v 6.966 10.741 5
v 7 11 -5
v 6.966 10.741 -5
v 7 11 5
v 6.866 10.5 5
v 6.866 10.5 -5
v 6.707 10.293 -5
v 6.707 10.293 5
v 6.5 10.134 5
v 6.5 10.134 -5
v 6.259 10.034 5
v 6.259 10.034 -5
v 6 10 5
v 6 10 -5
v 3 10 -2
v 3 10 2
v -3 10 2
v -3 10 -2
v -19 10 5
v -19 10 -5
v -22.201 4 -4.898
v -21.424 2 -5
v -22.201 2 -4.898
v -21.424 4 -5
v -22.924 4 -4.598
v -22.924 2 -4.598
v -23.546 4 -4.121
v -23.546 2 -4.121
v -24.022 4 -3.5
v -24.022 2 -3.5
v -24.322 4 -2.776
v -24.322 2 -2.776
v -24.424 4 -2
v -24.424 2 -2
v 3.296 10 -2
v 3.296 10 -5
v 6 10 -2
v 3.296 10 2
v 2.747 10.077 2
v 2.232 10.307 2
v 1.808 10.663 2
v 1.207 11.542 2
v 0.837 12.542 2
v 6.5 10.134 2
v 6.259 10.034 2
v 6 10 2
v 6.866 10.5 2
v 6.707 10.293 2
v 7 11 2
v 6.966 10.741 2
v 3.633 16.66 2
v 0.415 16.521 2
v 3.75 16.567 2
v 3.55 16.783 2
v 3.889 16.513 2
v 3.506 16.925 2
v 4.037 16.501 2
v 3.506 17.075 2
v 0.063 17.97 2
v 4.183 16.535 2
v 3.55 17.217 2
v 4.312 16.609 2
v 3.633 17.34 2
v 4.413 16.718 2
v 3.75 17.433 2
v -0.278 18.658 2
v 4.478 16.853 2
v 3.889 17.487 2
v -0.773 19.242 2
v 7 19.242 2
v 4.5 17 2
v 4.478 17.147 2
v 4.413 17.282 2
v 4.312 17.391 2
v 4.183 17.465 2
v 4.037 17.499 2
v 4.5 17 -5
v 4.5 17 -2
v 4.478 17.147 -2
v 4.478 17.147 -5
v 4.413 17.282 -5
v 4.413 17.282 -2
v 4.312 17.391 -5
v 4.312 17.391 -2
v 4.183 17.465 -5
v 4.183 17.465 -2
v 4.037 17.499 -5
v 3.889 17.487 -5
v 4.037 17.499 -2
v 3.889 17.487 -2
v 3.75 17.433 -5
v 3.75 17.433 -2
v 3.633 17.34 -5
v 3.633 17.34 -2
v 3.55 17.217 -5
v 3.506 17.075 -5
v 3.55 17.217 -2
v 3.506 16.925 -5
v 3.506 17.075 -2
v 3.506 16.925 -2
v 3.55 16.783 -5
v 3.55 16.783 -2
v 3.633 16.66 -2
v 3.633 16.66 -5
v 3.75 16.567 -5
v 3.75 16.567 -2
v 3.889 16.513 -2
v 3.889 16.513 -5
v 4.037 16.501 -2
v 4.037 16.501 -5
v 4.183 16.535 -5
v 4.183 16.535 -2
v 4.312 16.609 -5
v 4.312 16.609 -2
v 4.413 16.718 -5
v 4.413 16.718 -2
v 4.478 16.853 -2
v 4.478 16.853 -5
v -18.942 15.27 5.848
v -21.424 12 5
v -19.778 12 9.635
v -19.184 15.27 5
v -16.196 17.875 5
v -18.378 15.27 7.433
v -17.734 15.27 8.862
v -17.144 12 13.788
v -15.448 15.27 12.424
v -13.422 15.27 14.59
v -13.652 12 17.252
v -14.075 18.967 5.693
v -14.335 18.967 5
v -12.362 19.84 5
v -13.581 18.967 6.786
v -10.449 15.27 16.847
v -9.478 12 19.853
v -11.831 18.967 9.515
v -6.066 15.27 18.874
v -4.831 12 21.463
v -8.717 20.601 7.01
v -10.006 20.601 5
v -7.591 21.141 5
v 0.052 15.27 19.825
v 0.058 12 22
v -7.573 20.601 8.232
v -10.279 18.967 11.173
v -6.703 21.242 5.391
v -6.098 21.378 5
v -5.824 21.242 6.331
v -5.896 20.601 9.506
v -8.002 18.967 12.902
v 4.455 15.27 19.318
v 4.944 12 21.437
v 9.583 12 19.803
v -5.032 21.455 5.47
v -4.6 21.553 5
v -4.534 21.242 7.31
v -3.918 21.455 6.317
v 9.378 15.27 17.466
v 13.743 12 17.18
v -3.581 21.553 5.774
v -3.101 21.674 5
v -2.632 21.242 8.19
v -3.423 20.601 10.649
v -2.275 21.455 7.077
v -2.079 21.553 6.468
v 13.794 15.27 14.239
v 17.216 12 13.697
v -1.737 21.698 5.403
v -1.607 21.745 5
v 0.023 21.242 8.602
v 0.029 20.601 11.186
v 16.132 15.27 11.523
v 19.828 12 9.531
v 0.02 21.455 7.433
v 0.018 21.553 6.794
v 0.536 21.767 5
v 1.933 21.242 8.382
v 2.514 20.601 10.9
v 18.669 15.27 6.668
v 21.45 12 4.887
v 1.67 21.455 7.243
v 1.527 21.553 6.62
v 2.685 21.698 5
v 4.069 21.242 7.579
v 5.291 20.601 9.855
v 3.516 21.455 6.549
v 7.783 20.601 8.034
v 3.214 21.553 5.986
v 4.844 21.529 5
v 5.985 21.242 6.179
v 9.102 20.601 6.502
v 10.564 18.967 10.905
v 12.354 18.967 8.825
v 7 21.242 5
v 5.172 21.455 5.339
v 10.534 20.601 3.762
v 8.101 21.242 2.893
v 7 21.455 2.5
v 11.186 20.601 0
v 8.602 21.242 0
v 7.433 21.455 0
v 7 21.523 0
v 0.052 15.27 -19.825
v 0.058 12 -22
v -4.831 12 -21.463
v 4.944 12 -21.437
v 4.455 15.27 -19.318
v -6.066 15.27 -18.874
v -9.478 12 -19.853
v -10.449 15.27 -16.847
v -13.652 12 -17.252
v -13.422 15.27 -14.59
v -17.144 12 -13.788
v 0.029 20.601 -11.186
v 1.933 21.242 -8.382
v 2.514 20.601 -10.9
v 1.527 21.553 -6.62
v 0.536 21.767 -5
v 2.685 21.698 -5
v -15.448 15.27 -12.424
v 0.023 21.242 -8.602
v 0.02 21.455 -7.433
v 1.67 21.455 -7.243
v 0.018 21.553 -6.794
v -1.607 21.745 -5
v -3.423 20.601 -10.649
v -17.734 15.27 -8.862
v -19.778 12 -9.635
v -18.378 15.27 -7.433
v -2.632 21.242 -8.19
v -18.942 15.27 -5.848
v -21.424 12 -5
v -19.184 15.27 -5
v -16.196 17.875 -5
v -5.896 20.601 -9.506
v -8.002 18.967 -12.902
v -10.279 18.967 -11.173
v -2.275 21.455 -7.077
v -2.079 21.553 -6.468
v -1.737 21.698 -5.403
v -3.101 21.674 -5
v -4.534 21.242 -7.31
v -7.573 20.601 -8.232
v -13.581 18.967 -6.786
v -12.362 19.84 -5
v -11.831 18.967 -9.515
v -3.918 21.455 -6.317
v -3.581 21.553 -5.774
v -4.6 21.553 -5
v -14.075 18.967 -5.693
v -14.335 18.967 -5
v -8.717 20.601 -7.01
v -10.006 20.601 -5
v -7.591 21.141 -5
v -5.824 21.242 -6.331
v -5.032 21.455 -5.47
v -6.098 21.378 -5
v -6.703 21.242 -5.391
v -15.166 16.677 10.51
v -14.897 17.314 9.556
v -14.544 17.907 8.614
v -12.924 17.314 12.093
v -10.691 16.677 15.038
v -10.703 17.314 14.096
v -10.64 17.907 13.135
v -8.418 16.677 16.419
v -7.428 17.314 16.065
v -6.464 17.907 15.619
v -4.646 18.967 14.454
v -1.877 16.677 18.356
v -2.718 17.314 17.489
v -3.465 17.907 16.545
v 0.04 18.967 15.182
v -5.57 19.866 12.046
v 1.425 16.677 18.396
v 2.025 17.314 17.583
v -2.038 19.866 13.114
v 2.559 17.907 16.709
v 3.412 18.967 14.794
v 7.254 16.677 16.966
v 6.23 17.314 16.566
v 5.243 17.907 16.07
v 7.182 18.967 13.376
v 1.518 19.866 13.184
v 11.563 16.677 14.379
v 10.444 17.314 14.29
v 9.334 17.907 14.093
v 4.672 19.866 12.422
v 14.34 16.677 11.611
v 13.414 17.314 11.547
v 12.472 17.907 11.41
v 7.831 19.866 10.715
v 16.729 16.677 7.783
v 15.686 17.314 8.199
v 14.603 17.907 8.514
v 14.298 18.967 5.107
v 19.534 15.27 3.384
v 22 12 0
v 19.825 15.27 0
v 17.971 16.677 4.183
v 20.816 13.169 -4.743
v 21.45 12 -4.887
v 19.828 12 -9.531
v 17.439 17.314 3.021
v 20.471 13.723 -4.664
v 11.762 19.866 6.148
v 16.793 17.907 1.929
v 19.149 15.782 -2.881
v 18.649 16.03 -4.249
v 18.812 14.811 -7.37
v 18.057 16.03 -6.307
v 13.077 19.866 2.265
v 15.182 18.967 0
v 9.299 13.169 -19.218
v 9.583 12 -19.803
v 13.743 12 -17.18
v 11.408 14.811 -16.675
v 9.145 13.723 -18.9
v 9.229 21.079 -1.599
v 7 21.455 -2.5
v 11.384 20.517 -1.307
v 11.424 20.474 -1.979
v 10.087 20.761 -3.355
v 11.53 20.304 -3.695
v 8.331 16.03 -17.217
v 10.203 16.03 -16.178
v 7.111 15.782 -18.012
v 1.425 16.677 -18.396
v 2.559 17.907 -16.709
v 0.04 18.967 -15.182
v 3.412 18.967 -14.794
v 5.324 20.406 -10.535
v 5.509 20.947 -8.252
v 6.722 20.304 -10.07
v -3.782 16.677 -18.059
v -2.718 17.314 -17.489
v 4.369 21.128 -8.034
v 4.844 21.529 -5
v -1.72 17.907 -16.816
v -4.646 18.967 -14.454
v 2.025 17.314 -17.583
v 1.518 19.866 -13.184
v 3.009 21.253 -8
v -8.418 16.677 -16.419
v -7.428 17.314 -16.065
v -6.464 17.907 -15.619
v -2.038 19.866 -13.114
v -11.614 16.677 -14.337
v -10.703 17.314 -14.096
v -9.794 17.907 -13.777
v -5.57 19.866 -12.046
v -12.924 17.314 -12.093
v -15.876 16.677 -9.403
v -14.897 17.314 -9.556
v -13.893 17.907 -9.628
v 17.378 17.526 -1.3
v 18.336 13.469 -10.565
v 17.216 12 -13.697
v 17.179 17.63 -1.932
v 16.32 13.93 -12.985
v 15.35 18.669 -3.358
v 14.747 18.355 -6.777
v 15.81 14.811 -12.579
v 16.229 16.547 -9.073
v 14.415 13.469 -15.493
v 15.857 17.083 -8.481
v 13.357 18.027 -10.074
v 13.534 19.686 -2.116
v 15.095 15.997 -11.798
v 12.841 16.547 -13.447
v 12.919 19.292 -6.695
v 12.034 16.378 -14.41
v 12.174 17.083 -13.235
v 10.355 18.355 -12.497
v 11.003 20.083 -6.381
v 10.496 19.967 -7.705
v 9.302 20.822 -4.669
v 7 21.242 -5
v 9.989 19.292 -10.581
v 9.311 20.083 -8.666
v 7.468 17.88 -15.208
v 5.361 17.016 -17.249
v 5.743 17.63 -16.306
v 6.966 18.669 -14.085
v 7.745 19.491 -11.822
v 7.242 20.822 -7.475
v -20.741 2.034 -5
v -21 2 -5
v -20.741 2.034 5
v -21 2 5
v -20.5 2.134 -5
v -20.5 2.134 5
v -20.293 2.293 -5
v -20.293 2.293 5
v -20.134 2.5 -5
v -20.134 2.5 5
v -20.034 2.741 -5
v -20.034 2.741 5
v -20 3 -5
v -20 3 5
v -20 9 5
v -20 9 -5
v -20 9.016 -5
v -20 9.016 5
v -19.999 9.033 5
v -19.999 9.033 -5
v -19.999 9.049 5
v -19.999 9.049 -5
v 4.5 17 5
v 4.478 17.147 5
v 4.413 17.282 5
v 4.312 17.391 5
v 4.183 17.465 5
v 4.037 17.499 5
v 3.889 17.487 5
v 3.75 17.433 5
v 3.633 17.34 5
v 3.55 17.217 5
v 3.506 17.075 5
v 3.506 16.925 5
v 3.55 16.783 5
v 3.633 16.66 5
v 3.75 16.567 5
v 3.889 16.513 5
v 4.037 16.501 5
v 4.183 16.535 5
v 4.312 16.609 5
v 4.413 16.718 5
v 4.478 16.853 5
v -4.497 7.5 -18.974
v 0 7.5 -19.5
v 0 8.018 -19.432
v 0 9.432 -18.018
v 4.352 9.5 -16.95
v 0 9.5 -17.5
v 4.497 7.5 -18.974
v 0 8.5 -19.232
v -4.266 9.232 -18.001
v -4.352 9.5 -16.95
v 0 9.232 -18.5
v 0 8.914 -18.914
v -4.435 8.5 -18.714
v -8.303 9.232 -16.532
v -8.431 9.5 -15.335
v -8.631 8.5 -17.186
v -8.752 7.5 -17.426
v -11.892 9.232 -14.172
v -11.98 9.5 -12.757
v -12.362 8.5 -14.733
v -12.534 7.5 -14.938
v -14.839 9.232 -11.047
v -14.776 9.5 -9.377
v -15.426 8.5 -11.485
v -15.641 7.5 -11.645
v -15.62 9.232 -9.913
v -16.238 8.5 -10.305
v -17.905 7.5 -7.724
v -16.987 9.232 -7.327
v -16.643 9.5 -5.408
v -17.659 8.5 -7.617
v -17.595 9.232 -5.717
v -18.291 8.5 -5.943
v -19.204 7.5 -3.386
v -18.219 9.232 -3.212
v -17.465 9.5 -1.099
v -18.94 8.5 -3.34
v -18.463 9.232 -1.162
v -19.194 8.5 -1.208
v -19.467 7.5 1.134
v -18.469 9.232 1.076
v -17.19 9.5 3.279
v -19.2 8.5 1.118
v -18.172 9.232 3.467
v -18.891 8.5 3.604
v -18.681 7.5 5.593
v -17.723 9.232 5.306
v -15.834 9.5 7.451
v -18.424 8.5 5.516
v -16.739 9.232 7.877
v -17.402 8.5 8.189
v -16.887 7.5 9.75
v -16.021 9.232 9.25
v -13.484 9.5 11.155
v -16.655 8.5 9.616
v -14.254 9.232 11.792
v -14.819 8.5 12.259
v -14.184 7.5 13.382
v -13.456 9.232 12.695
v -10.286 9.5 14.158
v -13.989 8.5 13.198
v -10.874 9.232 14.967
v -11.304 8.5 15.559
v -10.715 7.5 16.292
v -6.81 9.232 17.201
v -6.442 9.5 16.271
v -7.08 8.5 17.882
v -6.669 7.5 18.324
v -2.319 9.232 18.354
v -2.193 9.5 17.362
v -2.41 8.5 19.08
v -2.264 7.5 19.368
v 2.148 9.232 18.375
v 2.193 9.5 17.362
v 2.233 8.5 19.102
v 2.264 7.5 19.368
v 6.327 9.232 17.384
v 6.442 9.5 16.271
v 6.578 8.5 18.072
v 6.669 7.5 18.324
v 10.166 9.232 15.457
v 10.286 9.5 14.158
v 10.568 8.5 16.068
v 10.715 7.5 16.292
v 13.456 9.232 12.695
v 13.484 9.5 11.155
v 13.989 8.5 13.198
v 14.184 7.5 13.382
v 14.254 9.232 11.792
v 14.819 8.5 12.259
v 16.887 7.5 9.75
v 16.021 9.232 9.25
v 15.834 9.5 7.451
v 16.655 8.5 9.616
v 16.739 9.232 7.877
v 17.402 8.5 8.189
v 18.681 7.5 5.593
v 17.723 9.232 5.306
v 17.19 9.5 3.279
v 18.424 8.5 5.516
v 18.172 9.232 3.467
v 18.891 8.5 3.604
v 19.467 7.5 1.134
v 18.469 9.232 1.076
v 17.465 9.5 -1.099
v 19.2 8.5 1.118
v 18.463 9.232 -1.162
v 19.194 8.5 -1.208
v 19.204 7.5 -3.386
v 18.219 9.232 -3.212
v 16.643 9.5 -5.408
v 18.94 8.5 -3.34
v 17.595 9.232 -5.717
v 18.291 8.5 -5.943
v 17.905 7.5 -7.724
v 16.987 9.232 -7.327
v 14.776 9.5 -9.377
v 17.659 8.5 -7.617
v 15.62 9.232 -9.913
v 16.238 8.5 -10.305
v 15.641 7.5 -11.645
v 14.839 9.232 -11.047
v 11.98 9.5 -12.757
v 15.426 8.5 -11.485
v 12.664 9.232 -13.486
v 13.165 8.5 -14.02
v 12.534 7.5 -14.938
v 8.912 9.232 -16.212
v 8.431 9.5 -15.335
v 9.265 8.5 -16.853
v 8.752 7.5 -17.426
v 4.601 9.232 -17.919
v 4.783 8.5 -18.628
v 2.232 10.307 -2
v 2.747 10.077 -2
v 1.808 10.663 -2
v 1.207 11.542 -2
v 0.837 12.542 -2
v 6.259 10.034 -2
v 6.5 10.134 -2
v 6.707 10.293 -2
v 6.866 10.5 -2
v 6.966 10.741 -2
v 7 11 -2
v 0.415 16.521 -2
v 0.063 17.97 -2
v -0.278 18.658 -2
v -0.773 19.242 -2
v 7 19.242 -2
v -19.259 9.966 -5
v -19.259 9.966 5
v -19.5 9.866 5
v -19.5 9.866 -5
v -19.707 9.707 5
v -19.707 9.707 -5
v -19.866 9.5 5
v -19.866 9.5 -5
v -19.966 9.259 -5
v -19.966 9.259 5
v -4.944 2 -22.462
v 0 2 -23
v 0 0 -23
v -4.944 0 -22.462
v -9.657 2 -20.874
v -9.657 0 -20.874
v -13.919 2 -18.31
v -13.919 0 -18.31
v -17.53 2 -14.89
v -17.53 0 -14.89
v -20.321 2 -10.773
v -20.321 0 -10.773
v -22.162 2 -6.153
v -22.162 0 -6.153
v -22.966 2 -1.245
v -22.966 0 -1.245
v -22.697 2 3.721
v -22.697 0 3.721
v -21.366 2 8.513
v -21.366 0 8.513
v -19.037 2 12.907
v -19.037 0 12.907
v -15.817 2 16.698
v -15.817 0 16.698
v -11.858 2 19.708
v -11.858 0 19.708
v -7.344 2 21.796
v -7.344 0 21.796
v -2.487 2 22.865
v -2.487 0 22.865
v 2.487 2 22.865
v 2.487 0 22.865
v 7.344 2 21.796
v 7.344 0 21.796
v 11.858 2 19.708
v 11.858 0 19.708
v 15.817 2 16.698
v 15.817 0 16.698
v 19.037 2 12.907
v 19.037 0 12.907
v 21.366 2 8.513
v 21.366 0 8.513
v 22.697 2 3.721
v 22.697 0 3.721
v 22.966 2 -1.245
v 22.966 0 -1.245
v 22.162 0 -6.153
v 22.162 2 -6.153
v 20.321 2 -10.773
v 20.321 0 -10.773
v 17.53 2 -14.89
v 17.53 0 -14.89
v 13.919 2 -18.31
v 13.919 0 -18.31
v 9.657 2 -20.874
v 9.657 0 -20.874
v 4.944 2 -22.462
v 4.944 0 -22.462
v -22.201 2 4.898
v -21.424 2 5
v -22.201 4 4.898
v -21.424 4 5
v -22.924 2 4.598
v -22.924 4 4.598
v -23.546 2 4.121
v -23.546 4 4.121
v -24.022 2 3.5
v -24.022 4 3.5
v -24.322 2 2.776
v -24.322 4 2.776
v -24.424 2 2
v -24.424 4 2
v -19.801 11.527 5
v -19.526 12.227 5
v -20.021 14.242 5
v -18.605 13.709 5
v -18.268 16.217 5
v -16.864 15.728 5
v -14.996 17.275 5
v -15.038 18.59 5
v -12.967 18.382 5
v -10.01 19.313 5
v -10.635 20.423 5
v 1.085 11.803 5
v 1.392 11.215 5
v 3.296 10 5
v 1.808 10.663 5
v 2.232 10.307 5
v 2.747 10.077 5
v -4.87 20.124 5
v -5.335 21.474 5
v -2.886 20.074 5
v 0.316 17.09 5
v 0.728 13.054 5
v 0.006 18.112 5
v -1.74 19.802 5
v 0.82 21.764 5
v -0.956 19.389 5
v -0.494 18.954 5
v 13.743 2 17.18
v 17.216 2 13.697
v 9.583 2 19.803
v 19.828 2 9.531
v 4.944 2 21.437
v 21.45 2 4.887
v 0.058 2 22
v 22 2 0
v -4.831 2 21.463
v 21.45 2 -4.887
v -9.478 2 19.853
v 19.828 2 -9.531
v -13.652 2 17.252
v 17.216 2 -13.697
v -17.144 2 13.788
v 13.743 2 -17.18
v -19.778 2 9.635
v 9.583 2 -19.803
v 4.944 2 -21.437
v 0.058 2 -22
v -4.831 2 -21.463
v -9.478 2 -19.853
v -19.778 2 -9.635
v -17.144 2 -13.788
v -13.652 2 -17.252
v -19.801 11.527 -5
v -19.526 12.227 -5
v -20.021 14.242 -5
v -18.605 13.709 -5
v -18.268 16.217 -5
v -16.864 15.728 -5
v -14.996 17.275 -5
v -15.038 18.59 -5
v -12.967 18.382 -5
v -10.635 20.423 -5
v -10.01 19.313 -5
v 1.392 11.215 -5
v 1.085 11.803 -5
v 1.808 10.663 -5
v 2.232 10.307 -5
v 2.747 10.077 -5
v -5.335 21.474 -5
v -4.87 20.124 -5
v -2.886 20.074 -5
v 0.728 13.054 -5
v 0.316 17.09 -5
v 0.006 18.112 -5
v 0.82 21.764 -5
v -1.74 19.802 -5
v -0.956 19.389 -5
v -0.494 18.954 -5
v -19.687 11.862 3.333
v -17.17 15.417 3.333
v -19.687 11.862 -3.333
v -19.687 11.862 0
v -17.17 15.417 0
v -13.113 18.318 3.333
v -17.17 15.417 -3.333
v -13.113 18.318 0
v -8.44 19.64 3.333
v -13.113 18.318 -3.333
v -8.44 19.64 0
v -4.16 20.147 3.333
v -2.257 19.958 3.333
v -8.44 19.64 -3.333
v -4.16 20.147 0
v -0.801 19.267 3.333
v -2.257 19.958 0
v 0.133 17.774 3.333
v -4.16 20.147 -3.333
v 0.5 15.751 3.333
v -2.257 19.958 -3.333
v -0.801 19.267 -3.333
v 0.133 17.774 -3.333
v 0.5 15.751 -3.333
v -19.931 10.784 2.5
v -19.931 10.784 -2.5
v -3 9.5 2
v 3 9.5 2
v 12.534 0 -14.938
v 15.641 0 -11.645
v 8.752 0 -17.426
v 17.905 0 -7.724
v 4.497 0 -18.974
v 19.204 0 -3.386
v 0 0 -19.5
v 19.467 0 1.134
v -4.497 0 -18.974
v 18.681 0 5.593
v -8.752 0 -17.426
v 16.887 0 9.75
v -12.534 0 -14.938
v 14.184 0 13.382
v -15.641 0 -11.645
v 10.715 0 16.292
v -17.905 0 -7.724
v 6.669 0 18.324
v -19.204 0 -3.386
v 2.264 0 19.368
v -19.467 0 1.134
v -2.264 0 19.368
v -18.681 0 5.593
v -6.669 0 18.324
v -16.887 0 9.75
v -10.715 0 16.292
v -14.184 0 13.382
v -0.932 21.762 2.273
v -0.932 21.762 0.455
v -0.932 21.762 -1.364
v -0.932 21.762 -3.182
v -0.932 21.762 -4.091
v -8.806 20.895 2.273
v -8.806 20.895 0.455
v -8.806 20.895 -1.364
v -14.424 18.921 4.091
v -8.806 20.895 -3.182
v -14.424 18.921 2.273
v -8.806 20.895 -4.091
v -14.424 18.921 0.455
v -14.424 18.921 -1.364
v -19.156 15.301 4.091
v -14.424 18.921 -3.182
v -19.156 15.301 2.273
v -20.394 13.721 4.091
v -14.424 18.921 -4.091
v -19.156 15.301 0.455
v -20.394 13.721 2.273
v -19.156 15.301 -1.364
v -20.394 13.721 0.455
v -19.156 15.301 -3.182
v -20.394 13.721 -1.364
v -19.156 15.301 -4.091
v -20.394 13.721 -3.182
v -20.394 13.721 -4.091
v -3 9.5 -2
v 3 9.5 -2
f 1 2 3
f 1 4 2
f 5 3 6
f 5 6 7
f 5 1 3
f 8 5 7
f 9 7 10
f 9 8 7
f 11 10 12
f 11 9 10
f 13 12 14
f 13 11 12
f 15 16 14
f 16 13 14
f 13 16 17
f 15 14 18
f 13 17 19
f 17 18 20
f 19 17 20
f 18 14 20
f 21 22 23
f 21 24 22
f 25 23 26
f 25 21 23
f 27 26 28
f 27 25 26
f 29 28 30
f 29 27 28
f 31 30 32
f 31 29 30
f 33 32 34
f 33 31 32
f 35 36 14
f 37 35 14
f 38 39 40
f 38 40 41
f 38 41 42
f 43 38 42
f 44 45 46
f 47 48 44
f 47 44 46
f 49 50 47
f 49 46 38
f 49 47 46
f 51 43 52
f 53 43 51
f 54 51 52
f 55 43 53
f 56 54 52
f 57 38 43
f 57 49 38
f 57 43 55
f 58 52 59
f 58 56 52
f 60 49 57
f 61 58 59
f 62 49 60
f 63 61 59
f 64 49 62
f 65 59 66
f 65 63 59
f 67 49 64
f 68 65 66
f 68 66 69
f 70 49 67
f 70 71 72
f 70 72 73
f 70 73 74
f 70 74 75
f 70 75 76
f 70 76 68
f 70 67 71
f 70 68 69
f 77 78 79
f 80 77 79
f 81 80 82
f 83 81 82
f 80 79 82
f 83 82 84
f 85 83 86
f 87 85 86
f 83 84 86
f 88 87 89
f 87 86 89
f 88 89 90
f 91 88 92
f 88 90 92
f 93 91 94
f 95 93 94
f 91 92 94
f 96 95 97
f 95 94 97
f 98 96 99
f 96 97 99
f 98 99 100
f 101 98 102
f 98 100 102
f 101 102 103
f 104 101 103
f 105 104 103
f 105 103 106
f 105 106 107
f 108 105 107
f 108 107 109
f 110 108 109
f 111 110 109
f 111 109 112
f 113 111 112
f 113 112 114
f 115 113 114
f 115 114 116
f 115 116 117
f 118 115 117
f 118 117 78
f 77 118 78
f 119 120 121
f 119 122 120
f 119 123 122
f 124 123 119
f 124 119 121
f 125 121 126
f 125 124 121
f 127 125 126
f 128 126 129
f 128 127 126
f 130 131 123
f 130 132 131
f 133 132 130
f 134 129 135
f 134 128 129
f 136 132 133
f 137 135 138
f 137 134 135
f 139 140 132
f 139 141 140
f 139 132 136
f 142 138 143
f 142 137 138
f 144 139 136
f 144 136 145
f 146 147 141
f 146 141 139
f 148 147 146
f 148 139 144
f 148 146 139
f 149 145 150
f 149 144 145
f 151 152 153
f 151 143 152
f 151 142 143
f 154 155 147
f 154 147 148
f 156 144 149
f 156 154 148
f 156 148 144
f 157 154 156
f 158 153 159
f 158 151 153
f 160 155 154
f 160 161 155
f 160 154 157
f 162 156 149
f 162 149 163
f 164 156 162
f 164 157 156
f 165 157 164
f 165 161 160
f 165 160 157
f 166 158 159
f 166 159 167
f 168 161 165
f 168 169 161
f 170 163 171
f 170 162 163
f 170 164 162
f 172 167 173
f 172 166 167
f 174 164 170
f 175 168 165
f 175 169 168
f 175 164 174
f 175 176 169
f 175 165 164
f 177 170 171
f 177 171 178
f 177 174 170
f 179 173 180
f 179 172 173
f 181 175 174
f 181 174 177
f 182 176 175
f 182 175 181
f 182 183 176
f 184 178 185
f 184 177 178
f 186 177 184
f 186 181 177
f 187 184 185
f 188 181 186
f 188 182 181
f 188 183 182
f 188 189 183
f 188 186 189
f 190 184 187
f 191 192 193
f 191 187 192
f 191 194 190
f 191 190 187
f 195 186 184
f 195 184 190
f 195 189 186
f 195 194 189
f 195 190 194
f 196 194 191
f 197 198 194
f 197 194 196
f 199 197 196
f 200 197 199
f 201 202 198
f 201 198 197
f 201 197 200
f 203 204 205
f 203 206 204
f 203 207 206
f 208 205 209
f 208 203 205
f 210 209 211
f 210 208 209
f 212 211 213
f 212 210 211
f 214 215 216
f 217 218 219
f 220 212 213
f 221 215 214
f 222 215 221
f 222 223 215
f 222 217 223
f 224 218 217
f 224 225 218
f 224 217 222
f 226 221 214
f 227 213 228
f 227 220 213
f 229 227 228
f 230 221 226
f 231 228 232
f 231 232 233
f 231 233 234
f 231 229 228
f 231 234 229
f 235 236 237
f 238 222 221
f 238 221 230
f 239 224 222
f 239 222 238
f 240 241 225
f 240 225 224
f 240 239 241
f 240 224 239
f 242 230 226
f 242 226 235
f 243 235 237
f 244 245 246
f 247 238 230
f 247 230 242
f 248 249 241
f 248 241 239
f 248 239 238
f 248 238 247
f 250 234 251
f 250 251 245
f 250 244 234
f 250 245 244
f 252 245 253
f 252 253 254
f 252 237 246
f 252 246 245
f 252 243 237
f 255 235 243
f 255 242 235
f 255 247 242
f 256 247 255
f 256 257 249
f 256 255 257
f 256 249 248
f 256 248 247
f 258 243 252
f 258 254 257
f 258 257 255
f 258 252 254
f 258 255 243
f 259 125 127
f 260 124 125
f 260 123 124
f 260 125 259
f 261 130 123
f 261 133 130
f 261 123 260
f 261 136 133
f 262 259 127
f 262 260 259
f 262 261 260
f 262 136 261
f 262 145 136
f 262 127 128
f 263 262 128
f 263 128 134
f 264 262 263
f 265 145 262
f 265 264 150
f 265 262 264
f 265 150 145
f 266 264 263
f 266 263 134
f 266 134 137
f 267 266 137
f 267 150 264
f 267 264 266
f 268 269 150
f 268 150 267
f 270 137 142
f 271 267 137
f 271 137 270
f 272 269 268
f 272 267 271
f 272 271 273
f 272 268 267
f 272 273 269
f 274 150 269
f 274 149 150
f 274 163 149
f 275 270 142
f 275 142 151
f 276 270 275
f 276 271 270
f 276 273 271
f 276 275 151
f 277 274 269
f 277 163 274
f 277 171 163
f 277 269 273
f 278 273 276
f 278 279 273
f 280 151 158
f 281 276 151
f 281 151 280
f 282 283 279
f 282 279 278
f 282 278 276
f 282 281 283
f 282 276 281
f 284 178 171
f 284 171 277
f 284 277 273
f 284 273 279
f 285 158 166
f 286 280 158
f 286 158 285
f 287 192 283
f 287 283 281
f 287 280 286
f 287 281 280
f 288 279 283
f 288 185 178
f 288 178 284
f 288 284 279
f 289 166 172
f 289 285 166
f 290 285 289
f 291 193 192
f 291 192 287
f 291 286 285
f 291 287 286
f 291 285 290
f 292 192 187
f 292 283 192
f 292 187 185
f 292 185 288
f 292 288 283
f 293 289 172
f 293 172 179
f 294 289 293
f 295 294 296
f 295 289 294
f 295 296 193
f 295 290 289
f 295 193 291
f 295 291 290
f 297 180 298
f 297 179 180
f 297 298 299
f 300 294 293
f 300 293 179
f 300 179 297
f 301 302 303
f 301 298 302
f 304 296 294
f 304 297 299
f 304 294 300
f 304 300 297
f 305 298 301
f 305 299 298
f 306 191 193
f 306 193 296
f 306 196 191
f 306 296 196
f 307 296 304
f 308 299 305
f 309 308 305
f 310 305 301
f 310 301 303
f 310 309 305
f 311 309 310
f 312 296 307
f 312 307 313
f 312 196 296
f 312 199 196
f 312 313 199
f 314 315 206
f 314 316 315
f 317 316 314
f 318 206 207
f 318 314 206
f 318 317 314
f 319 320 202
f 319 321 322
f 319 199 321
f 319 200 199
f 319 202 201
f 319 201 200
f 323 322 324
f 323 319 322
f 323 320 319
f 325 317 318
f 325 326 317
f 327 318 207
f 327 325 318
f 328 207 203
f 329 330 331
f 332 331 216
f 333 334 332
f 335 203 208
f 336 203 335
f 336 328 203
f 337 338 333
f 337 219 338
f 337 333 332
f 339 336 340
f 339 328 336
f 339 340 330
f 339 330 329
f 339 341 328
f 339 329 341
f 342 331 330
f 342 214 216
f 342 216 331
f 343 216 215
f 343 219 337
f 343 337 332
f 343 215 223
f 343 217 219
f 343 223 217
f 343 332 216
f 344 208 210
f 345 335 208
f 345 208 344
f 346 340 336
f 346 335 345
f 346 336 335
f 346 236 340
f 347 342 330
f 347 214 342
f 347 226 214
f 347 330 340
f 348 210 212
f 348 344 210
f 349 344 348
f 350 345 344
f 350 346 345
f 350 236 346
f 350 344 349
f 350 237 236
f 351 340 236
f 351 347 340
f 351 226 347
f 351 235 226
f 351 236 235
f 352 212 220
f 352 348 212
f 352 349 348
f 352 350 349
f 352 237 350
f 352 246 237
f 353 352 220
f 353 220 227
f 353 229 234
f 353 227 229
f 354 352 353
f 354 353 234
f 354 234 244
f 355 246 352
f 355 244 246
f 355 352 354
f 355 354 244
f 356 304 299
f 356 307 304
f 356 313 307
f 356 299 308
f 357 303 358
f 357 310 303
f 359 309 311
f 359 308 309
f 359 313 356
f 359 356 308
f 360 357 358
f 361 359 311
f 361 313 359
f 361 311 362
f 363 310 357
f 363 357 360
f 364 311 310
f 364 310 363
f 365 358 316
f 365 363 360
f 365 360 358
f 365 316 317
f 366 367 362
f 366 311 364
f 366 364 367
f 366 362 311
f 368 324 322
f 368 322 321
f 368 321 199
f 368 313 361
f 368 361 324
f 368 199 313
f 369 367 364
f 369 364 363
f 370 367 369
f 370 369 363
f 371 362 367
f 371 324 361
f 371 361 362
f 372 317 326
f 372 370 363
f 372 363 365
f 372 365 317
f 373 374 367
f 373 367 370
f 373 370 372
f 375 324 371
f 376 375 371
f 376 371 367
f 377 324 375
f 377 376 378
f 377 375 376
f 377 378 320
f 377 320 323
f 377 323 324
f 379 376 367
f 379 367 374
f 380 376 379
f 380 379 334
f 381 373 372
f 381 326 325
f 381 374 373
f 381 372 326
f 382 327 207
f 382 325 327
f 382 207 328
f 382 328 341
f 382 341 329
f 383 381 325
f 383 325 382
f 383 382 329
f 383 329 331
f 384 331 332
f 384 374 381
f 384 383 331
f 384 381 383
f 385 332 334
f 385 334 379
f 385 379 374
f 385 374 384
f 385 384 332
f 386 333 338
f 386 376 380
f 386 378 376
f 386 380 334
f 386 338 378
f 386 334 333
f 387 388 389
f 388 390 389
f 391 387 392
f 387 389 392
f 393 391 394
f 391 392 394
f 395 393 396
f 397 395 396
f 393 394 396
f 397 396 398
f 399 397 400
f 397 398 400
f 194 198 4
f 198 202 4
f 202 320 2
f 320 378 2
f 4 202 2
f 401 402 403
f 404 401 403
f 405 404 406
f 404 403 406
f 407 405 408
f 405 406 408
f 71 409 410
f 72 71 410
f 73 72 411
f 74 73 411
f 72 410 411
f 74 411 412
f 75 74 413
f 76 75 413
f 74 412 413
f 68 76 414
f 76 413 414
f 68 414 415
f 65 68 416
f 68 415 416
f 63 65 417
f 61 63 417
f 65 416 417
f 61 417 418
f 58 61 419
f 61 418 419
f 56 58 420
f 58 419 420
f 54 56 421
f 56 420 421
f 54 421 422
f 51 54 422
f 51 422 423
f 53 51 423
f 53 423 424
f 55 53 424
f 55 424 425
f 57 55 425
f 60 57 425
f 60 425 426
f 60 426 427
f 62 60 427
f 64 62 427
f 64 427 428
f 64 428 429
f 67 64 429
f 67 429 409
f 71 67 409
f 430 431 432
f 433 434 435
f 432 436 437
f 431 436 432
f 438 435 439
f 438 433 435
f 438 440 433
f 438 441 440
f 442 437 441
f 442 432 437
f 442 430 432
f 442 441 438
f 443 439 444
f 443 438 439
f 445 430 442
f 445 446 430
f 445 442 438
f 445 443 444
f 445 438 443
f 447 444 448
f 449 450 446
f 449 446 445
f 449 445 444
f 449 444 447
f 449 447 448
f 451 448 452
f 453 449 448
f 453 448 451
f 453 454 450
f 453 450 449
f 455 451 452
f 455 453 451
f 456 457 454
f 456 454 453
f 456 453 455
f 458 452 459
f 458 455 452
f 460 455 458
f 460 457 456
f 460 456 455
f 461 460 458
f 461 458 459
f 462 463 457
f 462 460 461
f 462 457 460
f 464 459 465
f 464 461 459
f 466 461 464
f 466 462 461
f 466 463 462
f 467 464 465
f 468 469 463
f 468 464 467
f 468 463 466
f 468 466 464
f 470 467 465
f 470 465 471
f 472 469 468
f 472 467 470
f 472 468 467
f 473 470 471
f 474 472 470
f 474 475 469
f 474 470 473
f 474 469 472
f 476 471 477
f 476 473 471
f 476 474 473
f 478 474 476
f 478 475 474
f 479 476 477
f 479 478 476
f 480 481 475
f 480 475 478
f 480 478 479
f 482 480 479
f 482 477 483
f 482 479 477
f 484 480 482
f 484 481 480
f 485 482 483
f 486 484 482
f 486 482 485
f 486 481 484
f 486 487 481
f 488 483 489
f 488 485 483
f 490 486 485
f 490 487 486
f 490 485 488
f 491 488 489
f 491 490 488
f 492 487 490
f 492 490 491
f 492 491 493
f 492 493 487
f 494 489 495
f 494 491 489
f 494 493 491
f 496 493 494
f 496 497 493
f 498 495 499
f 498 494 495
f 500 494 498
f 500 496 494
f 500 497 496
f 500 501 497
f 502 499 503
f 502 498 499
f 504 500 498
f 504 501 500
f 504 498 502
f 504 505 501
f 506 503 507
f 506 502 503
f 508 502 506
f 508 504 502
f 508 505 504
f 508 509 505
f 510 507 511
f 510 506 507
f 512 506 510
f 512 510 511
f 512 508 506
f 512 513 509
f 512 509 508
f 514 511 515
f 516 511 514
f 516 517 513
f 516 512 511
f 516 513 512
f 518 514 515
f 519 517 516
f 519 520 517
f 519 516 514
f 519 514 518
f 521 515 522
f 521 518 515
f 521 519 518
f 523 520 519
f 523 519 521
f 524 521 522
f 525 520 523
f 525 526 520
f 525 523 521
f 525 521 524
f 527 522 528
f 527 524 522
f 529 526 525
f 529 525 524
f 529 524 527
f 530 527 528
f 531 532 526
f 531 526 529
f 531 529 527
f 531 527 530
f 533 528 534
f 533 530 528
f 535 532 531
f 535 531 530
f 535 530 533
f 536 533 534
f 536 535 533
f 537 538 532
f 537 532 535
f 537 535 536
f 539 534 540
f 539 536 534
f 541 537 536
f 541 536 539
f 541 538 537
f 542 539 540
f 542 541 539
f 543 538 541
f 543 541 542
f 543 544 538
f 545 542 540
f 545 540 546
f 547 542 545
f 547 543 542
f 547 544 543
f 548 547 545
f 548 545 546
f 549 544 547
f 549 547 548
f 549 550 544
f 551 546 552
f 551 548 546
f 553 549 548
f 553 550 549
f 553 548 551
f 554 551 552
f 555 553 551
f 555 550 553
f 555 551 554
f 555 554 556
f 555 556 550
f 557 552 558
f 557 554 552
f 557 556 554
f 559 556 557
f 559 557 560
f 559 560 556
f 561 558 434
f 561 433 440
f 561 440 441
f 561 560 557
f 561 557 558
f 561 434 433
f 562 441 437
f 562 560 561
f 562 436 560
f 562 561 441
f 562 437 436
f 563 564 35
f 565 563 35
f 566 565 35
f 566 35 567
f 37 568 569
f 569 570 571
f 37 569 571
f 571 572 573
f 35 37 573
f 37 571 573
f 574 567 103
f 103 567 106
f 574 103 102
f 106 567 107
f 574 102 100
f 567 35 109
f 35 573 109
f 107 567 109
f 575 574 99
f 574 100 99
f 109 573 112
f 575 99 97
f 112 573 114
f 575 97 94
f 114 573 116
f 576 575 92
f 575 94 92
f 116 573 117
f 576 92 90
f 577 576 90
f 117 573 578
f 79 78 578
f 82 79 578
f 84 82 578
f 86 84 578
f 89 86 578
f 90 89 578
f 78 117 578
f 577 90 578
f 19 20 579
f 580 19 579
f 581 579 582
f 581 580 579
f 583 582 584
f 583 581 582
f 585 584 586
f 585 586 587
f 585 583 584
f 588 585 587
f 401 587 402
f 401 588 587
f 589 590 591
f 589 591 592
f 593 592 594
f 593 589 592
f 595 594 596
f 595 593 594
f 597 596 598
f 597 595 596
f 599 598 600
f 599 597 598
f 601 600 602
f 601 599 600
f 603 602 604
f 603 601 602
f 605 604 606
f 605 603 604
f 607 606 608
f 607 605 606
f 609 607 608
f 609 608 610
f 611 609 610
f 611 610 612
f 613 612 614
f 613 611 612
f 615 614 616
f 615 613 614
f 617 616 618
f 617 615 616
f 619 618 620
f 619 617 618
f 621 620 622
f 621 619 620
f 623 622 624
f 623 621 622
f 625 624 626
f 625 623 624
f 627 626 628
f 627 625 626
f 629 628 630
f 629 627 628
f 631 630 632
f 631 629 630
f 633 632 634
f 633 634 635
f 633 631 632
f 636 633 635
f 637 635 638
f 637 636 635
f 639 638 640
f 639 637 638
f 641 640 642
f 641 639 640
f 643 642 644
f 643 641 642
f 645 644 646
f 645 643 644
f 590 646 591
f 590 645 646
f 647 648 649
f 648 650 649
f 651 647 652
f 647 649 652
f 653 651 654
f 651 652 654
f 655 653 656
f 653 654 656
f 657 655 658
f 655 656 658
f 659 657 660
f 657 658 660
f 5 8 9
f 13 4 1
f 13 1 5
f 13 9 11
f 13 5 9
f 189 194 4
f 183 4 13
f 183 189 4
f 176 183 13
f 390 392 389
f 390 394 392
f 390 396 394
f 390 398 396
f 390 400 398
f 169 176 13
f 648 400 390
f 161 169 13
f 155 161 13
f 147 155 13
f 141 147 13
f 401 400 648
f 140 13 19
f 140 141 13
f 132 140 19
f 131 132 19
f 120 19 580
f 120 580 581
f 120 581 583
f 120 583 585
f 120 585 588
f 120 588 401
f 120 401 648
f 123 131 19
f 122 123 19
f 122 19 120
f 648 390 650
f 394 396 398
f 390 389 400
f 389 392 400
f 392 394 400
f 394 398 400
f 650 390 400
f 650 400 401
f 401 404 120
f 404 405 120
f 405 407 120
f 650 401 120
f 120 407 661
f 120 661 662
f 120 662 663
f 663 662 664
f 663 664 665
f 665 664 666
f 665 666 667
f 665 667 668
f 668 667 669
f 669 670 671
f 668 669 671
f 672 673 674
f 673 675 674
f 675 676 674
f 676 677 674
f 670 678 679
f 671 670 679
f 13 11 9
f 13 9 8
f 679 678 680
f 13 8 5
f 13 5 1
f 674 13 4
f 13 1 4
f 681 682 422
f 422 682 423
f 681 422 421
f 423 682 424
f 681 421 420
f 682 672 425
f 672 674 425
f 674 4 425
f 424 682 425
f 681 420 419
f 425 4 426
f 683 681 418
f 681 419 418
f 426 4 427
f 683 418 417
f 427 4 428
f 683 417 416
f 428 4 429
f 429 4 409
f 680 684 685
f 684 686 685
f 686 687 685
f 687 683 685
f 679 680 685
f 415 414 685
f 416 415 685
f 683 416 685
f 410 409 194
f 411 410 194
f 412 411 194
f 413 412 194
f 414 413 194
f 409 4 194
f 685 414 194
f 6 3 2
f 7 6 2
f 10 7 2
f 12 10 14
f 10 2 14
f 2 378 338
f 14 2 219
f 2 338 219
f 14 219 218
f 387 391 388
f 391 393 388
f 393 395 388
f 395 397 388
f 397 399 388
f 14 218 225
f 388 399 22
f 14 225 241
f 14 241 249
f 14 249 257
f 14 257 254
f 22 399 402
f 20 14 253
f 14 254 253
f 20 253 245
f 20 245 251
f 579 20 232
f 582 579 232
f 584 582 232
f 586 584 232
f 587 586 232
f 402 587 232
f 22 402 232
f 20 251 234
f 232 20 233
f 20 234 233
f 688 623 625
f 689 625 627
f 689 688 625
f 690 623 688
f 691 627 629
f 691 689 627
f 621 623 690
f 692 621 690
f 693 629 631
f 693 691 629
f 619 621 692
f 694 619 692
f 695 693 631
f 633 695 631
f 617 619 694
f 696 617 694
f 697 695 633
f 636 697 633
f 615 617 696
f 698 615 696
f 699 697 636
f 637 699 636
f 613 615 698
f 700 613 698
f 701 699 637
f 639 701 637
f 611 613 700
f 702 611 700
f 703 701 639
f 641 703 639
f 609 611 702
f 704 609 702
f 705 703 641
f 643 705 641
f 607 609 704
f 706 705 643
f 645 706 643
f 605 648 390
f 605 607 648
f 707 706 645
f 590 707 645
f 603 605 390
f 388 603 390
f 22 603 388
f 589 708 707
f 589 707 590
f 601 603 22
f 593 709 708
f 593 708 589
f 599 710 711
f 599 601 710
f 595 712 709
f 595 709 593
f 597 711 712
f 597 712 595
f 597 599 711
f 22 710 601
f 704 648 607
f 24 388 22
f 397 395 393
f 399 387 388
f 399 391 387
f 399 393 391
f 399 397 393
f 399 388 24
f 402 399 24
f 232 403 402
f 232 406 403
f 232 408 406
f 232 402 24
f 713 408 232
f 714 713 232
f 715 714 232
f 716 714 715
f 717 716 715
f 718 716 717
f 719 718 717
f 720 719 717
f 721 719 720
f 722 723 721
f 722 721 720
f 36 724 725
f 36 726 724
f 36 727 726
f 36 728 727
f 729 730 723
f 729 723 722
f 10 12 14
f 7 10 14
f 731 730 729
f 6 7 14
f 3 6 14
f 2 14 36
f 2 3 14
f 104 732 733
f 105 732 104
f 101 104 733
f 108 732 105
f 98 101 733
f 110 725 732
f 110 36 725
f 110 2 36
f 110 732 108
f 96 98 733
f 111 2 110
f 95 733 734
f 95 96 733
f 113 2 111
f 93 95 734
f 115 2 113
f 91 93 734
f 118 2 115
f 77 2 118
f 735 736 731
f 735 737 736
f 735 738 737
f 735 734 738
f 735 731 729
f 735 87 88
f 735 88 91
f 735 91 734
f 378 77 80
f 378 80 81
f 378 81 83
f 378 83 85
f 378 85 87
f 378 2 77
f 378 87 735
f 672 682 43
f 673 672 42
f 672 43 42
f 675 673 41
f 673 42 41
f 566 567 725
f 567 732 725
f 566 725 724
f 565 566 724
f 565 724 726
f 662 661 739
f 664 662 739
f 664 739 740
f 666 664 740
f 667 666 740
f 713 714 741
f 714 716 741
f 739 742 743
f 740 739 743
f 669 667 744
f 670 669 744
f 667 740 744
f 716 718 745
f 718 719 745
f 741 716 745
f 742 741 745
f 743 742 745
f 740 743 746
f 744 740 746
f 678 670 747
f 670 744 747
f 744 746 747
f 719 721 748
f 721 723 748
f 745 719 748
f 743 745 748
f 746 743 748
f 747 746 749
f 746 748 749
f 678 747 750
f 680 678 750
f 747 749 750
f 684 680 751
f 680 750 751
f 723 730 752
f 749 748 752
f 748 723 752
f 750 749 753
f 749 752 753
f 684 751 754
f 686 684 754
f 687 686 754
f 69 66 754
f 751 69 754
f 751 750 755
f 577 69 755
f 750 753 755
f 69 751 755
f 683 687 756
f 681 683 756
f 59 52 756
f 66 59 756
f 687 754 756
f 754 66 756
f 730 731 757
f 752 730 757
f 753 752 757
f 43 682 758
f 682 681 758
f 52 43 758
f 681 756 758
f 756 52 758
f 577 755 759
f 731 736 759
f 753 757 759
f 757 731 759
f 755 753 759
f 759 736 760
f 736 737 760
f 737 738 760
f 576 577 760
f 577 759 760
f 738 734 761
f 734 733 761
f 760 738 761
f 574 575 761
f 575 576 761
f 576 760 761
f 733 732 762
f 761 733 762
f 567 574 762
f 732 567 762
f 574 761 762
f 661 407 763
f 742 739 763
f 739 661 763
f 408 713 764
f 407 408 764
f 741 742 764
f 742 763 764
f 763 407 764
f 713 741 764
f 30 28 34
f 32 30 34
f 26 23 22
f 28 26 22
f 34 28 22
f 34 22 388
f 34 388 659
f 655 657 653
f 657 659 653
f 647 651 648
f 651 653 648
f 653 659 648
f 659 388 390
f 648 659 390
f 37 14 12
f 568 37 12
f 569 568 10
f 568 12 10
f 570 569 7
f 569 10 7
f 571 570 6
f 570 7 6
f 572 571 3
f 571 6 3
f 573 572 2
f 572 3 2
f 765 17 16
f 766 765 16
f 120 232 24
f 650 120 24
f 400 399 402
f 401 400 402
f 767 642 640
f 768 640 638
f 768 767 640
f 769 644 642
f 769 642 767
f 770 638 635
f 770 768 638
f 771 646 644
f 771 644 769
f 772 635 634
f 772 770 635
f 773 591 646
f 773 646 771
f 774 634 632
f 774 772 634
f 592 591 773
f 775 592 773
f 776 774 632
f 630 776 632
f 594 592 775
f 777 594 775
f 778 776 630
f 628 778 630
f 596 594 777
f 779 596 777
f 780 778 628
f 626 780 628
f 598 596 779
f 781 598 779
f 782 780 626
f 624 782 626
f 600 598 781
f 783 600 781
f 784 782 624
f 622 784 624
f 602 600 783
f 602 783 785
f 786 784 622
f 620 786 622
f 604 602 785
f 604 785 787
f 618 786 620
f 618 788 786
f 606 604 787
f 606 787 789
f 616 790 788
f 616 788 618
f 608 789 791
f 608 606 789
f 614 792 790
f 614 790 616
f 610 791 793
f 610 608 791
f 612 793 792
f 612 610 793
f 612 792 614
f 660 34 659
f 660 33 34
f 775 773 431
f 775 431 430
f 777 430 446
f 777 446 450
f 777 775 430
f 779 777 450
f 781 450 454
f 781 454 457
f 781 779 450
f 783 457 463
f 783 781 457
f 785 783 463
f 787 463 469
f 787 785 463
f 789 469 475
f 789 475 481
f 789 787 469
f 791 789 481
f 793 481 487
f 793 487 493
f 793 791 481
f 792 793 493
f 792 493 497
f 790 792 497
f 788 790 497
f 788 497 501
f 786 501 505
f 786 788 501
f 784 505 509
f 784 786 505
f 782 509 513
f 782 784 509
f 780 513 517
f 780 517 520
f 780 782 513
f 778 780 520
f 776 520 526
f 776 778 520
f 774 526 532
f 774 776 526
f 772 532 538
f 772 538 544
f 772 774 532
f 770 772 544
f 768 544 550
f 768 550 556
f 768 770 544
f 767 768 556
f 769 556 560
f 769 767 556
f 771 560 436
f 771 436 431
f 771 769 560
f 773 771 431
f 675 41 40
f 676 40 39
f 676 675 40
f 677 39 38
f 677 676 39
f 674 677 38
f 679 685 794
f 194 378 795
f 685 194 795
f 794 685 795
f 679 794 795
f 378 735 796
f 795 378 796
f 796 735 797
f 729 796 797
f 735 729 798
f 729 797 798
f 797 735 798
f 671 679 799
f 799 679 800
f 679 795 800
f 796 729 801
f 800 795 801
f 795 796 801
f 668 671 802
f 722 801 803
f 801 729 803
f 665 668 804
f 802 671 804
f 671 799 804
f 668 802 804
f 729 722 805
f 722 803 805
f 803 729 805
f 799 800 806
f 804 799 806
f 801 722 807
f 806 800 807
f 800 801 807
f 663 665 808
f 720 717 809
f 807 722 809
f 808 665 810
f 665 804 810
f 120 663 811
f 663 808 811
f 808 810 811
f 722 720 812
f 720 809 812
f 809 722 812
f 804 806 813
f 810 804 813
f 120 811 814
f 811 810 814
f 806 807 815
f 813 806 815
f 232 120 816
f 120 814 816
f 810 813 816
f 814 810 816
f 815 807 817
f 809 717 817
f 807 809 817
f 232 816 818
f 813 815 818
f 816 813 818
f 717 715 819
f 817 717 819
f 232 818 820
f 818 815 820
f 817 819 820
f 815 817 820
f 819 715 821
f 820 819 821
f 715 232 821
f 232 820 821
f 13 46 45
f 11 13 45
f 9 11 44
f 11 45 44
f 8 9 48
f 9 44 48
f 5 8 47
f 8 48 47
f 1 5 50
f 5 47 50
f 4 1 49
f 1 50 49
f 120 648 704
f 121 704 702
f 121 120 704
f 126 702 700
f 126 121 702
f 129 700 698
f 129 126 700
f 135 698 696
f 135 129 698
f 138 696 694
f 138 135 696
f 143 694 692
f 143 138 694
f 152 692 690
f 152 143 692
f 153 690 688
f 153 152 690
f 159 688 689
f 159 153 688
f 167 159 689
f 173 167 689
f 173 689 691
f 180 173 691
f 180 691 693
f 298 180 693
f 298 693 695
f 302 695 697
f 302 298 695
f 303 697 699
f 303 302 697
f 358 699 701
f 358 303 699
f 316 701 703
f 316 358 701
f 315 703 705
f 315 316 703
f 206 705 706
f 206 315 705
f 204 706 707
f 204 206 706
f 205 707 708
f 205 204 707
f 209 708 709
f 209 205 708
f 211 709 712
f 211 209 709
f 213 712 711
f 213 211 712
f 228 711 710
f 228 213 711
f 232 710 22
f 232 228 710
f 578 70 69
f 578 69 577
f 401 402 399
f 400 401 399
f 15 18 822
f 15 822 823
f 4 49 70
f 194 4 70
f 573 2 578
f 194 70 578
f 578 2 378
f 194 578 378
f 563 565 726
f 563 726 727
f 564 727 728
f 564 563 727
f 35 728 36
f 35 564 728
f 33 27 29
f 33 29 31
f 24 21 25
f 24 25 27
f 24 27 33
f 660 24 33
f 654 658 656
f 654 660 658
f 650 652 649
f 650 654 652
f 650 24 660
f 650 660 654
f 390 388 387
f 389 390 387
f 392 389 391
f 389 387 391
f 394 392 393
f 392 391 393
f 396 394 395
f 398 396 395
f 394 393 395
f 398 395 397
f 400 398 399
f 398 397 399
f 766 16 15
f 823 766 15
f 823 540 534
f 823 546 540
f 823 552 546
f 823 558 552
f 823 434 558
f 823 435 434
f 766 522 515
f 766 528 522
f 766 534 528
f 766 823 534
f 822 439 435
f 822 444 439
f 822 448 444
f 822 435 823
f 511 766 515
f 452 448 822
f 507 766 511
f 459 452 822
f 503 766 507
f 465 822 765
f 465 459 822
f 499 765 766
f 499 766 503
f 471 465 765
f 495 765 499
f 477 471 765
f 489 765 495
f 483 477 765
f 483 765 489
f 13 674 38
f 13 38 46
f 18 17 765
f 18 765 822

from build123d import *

# Parameters (mm, degrees)
LEVER_SLOT_CUT_DEPTH      = 5
LEVER_SLOT_CUT_DEPTH_BACK = 5
LEVER_SLOT_FILLET_R       = 1
CUP_PLUNGER_PROFILE_W     = 6
CUP_PLUNGER_PROFILE_H     = 4
CUP_PLUNGER_CUT_DEPTH     = 35.591006714
LEVER_EXTRUDE_DEPTH       = 5
LEVER_EXTRUDE_DEPTH_BACK  = 5
FINGER_CATCH_PROFILE_W    = 10
FINGER_CATCH_PROFILE_H    = 2
FINGER_CATCH_DEPTH        = 3
FINGER_CATCH_FILLET_R     = 3
LEVER_START               = -10
LEVER_SHAPE_CUT_DEPTH     = 10
LEVER_FILLET_R            = 2
PIN_HOLE_PROFILE_R        = 0.5
PIN_HOLE_CUT_DEPTH        = 10
PLUNGER_SLOT_PROFILE_W    = 4
PLUNGER_SLOT_PROFILE_H    = 10
PLUNGER_SLOT_CUT_DEPTH    = 10


with BuildPart() as part:
    # Suction Cup Profile → Suction Cup Revolve (revolve)
    with BuildSketch(Plane.XY):
        with BuildLine():
            Line((0, 0), (-23, 0))
            Line((-23, 0), (-23, 2))
            Line((-23, 2), (-22, 2))
            Line((-22, 2), (-22, 12))
            add(Edge.make_bspline(
                [(-22, 12), (-18.421815933, 19.051481144), (-11.029248688, 22), (0, 22)],
                knots=[0, 0, 0, 0, 1, 1, 1, 1], degree=3))
            Line((0, 22), (0, 0))
        make_face()
    revolve(axis=Axis((0, 0, 0), (0, 1, 0)))

    # Lever Slot Profile → Lever Slot Cut (cut, two sides: drawn at the far end of the back side and taken through both)
    with BuildSketch(Plane.XY.offset(-LEVER_SLOT_CUT_DEPTH_BACK)):
        Polygon((7, 10), (-20, 10), (-20, 2), (-23, 2), (-23, 26), (7, 26), align=None)
    extrude(amount=LEVER_SLOT_CUT_DEPTH + LEVER_SLOT_CUT_DEPTH_BACK, mode=Mode.SUBTRACT)

    # Lever Slot Fillet
    lever_slot_fillet_edges = [part.edges().sort_by_distance(p)[0] for p in [
        (7, 10, 0),
        (-20, 2, 0),
        (-20, 10, 0),
    ]]
    fillet(lever_slot_fillet_edges, radius=LEVER_SLOT_FILLET_R)

    # Cup Plunger Profile → Cup Plunger Cut (cut, through all)
    with BuildSketch(Plane(origin=(0, 10, 0), x_dir=(1, 0, 0), z_dir=(0, 1, 0))):
        Rectangle(CUP_PLUNGER_PROFILE_W, CUP_PLUNGER_PROFILE_H)
    extrude(amount=-CUP_PLUNGER_CUT_DEPTH, mode=Mode.SUBTRACT)

    # Pad Slot Profile → Pad Cut Profile (revolve, cut)
    with BuildSketch(Plane.XY):
        with BuildLine():
            Line((0, 9.5), (-17.5, 9.5))
            ThreePointArc((-17.5, 9.5), (-18.914213562, 8.914213562), (-19.5, 7.5))
            Line((-19.5, 7.5), (-19.5, -2.5))
            Line((-19.5, -2.5), (0, -2.5))
            Line((0, -2.5), (0, 9.5))
        make_face()
    revolve(axis=Axis((0, 0, 0), (0, 1, 0)), mode=Mode.SUBTRACT)


with BuildPart() as body_2:
    # Lever Extrude Profile → Lever Extrude (new, two sides: drawn at the far end of the back side and taken through both)
    with BuildSketch(Plane.XY.offset(-LEVER_EXTRUDE_DEPTH_BACK)):
        with BuildLine():
            Line((-19, 10), (6, 10))
            ThreePointArc((6, 10), (6.707106781, 10.292893219), (7, 11))
            Line((7, 11), (7, 21.242307449))
            add(Edge.make_bspline(
                [(7, 21.242307449), (5.685724143, 21.456777565), (4.358857594, 21.595849723), (1.708877373, 21.760019267), (0.387036337, 21.785917476), (-2.251022195, 21.737377334), (-3.567218971, 21.662569282), (-6.192544108, 21.386836768), (-7.501677285, 21.185998254), (-10.10988568, 20.604864637), (-11.383851689, 20.229558725), (-13.228387001, 19.49844466), (-13.832374383, 19.226486682), (-15.014912539, 18.616381153), (-15.596770073, 18.275704638), (-17.259236778, 17.163531752), (-18.26441362, 16.299840579), (-19.378857685, 15.051885465), (-19.594879608, 14.793479293), (-20.007615977, 14.266070663), (-20.599773978, 13.456964359), (-21.113866261, 12.595730264), (-21.424285286, 12)],
                knots=[0, 0, 0, 0, 0.125, 0.125, 0.25, 0.25, 0.375, 0.375, 0.5, 0.5, 0.625, 0.625, 0.6875, 0.6875, 0.75, 0.75, 0.875, 0.875, 0.90625, 0.90625, 0.9375, 1, 1, 1, 1], degree=3))
            Line((-21.424285286, 12), (-21.424285286, 2))
            Line((-21.424285286, 2), (-21, 2))
            ThreePointArc((-21, 2), (-20.292893219, 2.292893219), (-20, 3))
            Line((-20, 3), (-20, 9))
            ThreePointArc((-20, 9), (-19.707106781, 9.707106781), (-19, 10))
        make_face()
    extrude(amount=LEVER_EXTRUDE_DEPTH + LEVER_EXTRUDE_DEPTH_BACK)

    # Finger Catch Profile → Finger Catch (add)
    with BuildSketch(Plane.ZY.offset(21.424285286)):
        with Locations((0, 3)):
            Rectangle(FINGER_CATCH_PROFILE_W, FINGER_CATCH_PROFILE_H)
    extrude(amount=FINGER_CATCH_DEPTH)

    # Finger Catch Fillet
    finger_catch_fillet_edges = [body_2.edges().sort_by_distance(p)[0] for p in [
        (-24.424285286, 3, 5),
        (-24.424285286, 3, -5),
    ]]
    fillet(finger_catch_fillet_edges, radius=FINGER_CATCH_FILLET_R)

    # Lever Shape Profile → Lever Shape Cut (cut)
    with BuildSketch(Plane.XY.offset(5).offset(LEVER_START)):
        with BuildLine():
            Line((-19, 10), (2.560949496, 10))
            add(Edge.make_bspline(
                [(-19.998787914, 9.04922096), (-19.960247668, 10.620318048), (-19.960308906, 12.001719532), (-15.565568962, 17.857367825), (-9.805108275, 19.631012422), (-0.471896304, 20.833531175), (0.805670786, 15.408896049), (0.461682929, 11.477569724), (2.560949496, 10)],
                knots=[0.000763226, 0.000763226, 0.000763226, 0.000763226, 0.074344062, 0.186491464, 0.469322649, 0.695904825, 0.824059419, 1, 1, 1, 1], degree=3))
            ThreePointArc((-19.998787914, 9.04922096), (-19.689484967, 9.724299993), (-19, 10))
        make_face()
    extrude(amount=LEVER_SHAPE_CUT_DEPTH, mode=Mode.SUBTRACT)

    # Lever Fillet
    lever_fillet_edges = [body_2.edges().sort_by_distance(p)[0] for p in [
        (2.560949496, 10, 0),
    ]]
    fillet(lever_fillet_edges, radius=LEVER_FILLET_R)

    # Pin Hole Profile → Pin Hole Cut (cut)
    with BuildSketch(Plane.XY.offset(5)):
        with Locations((4, 17)):
            Circle(PIN_HOLE_PROFILE_R)
    extrude(amount=-PIN_HOLE_CUT_DEPTH, mode=Mode.SUBTRACT)

    # Plunger Slot Profile → Plunger Slot Cut (cut)
    with BuildSketch(Plane(origin=(7, 0, 0), x_dir=(0, 0, -1), z_dir=(1, 0, 0))):
        with Locations((0, 14.242307449)):
            Rectangle(PLUNGER_SLOT_PROFILE_W, PLUNGER_SLOT_PROFILE_H)
    extrude(amount=-PLUNGER_SLOT_CUT_DEPTH, mode=Mode.SUBTRACT)


solid = Compound([part.part, body_2.part])
